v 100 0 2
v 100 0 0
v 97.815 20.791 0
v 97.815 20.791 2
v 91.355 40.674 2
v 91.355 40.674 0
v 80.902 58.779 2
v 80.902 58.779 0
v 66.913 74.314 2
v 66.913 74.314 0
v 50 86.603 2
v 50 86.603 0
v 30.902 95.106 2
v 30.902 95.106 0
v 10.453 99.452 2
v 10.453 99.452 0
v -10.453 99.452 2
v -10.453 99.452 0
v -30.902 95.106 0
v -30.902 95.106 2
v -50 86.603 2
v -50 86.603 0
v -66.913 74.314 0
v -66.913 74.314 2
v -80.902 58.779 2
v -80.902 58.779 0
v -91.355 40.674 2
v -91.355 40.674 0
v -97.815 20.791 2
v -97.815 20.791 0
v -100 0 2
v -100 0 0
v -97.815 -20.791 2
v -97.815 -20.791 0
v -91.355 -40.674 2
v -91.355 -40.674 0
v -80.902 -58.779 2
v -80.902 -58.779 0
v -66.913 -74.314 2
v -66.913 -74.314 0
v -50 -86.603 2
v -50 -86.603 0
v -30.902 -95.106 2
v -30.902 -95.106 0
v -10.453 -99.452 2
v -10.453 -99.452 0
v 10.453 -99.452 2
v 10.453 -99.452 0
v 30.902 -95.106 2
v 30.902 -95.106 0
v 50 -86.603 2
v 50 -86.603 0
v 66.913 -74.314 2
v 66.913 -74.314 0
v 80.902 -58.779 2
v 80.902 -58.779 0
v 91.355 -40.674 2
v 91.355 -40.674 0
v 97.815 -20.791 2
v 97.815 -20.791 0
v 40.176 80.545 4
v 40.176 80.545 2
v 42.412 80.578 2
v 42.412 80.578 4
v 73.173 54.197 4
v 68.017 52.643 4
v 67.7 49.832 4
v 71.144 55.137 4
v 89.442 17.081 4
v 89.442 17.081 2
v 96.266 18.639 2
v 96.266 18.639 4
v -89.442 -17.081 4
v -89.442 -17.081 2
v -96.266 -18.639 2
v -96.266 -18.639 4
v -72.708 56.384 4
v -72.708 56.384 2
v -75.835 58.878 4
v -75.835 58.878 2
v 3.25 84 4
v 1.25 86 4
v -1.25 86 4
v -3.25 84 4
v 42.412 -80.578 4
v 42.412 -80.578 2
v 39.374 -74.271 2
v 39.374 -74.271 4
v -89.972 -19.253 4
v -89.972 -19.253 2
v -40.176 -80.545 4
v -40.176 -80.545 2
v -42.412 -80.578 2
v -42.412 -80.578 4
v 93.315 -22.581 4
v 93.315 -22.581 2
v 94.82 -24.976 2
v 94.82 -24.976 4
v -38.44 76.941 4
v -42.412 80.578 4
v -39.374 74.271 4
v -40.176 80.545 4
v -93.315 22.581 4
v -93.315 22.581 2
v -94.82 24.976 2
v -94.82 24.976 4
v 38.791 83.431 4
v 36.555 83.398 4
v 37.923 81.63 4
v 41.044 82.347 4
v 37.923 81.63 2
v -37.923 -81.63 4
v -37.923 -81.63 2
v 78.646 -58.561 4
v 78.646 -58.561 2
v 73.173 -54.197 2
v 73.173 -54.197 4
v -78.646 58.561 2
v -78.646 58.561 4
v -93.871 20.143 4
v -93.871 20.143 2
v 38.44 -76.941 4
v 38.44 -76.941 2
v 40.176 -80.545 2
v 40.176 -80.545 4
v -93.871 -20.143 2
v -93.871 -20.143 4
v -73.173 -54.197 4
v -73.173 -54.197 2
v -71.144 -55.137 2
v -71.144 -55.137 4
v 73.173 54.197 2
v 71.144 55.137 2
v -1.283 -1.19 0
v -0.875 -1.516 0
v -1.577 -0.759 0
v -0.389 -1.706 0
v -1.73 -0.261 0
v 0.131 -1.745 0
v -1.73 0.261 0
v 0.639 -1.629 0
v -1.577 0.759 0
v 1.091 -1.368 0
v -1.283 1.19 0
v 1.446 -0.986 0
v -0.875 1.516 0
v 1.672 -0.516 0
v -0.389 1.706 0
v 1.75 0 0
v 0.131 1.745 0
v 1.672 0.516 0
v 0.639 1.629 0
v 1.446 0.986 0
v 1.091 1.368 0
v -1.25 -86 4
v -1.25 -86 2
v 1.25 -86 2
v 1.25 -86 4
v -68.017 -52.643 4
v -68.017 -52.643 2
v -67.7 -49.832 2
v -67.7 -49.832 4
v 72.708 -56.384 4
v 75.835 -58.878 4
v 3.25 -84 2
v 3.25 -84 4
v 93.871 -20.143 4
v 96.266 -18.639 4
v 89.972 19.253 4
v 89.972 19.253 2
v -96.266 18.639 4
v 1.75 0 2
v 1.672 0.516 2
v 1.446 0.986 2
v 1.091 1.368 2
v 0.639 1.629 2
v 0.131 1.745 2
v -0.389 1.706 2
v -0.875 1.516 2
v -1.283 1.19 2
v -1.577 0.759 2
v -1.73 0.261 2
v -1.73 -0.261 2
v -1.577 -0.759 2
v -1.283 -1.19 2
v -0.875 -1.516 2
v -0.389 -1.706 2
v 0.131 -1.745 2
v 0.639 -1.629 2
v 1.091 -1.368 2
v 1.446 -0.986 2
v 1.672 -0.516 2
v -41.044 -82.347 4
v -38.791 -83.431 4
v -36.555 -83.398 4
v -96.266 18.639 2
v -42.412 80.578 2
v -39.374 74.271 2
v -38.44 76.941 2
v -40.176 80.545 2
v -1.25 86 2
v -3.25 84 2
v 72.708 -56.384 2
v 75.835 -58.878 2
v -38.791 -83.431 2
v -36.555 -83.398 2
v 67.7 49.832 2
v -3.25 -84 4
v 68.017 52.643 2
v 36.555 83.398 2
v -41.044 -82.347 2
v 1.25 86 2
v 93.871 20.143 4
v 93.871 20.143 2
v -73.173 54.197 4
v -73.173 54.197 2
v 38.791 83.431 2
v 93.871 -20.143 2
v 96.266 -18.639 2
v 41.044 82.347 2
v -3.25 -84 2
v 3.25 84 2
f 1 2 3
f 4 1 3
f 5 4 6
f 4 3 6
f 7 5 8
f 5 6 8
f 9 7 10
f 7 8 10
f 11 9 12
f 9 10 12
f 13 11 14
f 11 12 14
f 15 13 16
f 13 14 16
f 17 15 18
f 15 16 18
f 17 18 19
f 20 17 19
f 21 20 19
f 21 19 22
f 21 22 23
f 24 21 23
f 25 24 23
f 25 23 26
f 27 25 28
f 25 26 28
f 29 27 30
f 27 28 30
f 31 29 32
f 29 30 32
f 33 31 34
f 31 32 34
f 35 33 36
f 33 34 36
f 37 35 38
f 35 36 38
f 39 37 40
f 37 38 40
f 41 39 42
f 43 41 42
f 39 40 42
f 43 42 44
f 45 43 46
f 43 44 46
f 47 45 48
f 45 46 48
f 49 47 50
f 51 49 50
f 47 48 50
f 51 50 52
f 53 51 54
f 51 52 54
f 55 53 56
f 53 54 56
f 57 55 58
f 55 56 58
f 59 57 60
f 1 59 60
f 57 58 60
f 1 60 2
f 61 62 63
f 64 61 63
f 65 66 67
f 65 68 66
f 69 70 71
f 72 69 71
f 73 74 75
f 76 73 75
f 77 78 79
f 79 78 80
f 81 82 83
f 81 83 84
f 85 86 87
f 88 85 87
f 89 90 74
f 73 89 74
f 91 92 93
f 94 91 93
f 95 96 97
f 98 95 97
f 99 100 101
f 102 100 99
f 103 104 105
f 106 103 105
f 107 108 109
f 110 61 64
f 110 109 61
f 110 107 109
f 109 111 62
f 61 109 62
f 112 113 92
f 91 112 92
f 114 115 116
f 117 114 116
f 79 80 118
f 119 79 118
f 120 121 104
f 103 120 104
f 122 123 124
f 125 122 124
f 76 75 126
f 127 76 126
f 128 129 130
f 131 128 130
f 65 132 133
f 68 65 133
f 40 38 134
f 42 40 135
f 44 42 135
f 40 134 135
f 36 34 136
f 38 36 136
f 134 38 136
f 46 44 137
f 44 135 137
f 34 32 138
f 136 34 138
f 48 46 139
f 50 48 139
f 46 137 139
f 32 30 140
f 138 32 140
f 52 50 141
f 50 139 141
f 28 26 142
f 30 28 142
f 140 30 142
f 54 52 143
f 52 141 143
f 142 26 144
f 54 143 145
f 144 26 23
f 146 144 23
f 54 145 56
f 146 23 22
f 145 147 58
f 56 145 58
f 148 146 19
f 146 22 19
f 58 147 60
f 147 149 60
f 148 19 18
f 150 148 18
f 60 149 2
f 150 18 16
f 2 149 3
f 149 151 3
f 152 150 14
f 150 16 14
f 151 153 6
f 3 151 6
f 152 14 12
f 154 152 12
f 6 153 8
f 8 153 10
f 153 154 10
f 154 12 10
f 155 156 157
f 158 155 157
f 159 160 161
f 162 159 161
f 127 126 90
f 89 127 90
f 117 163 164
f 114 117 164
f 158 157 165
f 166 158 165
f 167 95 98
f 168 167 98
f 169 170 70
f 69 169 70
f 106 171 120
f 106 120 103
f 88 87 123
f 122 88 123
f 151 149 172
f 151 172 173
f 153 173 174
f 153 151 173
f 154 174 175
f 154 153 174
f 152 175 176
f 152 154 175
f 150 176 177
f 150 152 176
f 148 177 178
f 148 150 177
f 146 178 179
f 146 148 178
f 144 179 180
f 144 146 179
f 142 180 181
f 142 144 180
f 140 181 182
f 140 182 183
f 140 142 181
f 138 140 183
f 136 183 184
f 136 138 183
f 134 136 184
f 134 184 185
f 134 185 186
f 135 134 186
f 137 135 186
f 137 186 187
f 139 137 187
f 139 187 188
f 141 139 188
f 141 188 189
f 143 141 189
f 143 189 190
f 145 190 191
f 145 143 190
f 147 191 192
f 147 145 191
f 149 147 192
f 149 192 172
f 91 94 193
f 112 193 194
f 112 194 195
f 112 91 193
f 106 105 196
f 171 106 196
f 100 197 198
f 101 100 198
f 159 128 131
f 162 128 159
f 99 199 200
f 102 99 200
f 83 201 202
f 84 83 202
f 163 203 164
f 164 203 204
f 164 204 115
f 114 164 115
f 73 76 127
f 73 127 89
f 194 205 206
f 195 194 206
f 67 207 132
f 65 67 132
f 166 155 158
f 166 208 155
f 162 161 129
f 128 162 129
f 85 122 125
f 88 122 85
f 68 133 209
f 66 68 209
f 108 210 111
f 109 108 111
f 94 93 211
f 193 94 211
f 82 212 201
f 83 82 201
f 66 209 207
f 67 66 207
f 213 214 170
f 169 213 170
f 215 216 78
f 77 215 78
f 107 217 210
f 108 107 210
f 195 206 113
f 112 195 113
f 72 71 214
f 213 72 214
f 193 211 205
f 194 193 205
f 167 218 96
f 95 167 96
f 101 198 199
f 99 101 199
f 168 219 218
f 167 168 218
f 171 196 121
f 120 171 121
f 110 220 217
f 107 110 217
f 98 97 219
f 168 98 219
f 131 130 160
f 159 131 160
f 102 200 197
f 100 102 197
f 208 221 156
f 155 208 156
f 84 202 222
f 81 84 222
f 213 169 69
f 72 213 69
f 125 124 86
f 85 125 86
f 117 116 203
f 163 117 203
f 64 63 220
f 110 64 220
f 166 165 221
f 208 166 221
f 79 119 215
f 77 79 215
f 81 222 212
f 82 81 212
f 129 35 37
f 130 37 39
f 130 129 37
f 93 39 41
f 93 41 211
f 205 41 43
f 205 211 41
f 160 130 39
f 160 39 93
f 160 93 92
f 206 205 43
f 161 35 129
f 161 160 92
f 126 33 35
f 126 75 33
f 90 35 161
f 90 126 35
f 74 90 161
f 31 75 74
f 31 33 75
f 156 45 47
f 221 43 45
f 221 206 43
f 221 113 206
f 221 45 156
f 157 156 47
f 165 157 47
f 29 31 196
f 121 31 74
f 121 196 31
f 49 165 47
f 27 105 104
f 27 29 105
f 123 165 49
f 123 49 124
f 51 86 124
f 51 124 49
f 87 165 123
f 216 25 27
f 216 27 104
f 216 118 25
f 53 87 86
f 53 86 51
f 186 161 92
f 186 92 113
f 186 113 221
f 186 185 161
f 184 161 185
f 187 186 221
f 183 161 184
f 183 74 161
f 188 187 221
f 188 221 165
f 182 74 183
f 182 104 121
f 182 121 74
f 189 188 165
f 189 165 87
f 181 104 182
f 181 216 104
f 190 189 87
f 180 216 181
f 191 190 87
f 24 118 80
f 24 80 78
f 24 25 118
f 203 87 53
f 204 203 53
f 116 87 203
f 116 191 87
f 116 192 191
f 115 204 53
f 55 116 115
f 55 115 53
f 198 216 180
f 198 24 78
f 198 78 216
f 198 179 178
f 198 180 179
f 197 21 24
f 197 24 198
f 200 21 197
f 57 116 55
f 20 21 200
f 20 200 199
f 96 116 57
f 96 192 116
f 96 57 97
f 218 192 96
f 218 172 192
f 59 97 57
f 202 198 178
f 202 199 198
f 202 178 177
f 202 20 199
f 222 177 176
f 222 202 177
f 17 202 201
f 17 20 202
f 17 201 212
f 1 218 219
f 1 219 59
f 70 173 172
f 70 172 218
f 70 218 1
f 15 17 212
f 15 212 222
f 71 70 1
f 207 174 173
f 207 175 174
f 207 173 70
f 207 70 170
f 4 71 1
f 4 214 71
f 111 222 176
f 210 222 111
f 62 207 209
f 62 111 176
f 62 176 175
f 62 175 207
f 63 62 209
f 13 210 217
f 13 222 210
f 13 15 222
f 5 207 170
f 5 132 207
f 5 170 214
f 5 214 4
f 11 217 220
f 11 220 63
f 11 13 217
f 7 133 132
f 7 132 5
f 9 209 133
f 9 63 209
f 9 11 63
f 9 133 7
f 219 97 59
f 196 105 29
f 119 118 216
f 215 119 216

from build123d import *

# Parameters (mm, degrees)
SKETCH1_R           = 100
SKETCH1_R_2         = 1.75
BOSS_EXTRUDE1_DEPTH = 2
BOSS_EXTRUDE2_DEPTH = 2


with BuildPart() as part:
    # Sketch1 → Boss-Extrude1 (new body)
    with BuildSketch(Plane.XY):
        Circle(SKETCH1_R)
        Circle(SKETCH1_R_2, mode=Mode.SUBTRACT)
    extrude(amount=BOSS_EXTRUDE1_DEPTH)

    # Sketch2 → Boss-Extrude2 (add)
    with BuildSketch(Plane.XY.offset(2)):
        Polygon((-3.25, -84), (-1.25, -86), (1.25, -86), (3.25, -84), align=None)
        Polygon((-40.175747605, -80.544843437), (-42.41156908, -80.578044827), (-41.043515084, -82.346781173), (-38.791092914, -83.431490521), (-36.555271439, -83.398289131), (-37.923325436, -81.629552785), align=None)
        Polygon((-68.016869745, -52.642833607), (-67.700186383, -49.832191038), (-73.173006761, -54.196619651), (-71.144195674, -55.136792814), align=None)
        Polygon((-89.971519088, -19.253266034), (-89.441633044, -17.080889275), (-96.266128429, -18.638535813), (-93.871230737, -20.14334977), align=None)
        Polygon((-93.314928402, 22.58066955), (-94.819742358, 24.975567242), (-96.266128429, 18.638535813), (-93.871230737, 20.14334977), align=None)
        Polygon((-78.645827138, 58.561048264), (-73.173006761, 54.196619651), (-72.707858639, 56.383772418), (-75.835184569, 58.877731625), align=None)
        Polygon((-42.41156908, 80.578044827), (-39.374382907, 74.271262752), (-38.440212649, 76.940967966), (-40.175747605, 80.544843437), align=None)
        Polygon((-3.25, 84), (3.25, 84), (1.25, 86), (-1.25, 86), align=None)
        Polygon((40.175747605, 80.544843437), (42.41156908, 80.578044827), (41.043515084, 82.346781173), (38.791092914, 83.431490521), (36.555271439, 83.398289131), (37.923325436, 81.629552785), align=None)
        Polygon((68.016869745, 52.642833607), (67.700186383, 49.832191038), (73.173006761, 54.196619651), (71.144195674, 55.136792814), align=None)
        Polygon((89.971519088, 19.253266034), (89.441633044, 17.080889275), (96.266128429, 18.638535813), (93.871230737, 20.14334977), align=None)
        Polygon((93.314928402, -22.58066955), (94.819742358, -24.975567242), (96.266128429, -18.638535813), (93.871230737, -20.14334977), align=None)
        Polygon((78.645827138, -58.561048264), (73.173006761, -54.196619651), (72.707858639, -56.383772418), (75.835184569, -58.877731625), align=None)
        Polygon((42.41156908, -80.578044827), (39.374382907, -74.271262752), (38.440212649, -76.940967966), (40.175747605, -80.544843437), align=None)
    extrude(amount=BOSS_EXTRUDE2_DEPTH)


solid = part.part
